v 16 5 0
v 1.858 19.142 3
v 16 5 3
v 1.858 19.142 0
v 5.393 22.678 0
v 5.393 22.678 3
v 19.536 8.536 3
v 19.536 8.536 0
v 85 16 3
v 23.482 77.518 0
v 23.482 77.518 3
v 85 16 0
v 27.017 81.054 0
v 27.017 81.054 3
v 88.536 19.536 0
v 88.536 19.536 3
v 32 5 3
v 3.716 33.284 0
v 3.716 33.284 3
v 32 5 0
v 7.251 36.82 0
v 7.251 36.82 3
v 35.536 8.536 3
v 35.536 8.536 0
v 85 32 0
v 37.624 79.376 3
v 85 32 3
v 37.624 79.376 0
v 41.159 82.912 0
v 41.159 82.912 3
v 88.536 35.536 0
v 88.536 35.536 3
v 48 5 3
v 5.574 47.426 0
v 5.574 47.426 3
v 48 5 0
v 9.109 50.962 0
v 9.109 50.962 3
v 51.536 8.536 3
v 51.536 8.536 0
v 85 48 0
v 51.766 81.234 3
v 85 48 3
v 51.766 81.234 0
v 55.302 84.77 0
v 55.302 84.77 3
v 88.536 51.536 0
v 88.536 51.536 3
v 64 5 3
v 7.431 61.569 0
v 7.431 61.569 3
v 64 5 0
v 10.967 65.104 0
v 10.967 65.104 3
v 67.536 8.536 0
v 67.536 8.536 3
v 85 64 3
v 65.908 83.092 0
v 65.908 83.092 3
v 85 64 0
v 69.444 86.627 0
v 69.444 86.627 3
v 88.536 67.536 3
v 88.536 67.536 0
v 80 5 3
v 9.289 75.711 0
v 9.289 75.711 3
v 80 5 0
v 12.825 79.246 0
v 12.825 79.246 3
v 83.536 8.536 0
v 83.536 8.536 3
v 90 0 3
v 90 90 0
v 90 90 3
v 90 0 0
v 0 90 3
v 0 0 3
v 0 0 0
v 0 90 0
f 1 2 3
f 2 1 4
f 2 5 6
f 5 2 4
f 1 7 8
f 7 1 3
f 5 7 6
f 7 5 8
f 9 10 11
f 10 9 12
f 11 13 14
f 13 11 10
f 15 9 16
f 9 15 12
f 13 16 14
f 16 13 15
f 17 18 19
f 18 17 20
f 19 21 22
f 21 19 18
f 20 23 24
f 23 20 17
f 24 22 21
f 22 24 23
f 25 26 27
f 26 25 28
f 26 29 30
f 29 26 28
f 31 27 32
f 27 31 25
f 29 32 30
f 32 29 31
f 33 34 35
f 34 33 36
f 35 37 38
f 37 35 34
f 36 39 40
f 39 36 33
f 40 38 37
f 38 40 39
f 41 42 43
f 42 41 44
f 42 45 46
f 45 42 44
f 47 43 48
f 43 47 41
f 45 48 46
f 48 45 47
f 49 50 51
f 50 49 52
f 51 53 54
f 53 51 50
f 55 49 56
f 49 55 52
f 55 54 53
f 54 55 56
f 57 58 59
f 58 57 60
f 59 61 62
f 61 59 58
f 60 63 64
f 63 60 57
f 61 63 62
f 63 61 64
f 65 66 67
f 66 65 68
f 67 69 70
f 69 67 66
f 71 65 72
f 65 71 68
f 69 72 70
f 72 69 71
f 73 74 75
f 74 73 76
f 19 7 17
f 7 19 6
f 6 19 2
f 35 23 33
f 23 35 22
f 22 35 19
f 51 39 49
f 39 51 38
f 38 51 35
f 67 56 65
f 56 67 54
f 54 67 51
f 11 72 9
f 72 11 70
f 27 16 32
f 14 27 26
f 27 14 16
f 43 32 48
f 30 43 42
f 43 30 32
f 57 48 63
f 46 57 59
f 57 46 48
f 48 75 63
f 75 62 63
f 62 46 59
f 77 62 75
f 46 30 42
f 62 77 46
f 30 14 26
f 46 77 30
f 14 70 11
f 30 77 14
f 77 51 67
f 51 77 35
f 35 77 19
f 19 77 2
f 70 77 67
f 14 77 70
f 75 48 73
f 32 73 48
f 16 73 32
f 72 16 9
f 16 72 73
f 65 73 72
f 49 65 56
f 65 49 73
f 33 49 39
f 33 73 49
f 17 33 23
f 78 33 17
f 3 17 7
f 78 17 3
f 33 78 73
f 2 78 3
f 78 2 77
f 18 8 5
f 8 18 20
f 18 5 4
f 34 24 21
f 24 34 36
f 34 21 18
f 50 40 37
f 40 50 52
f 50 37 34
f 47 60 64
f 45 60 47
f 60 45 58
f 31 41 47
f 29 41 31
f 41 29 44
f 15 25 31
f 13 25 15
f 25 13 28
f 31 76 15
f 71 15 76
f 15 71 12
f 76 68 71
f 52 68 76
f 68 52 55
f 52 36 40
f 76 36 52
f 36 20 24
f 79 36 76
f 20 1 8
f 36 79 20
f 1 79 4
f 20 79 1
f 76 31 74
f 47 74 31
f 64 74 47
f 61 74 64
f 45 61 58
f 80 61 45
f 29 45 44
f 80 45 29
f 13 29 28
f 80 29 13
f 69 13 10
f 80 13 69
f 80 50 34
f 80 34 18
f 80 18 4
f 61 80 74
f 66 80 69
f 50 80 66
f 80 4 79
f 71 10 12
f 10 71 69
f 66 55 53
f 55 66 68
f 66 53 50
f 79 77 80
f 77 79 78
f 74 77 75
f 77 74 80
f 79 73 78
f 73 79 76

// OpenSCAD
w = 90;
h = 90;
d = 3;

// holes:
hw = 5;
hw_gap = 5;
count = w / (hw + hw_gap);

difference(){
    cube([w,h,d]);
    
    for(i = [1 : count]){
        if(i < count / 2 + 0.5){
             color("red")
             cubes(i);
            }
        if (i==count/2 + 0.5) {
             color("green")
             cubes(i);
            }
        else {
             color("green")
             otherCube(i);
            }
    }
}

module cubes(var) {
     translate([var*(hw+hw_gap)+var*6, hw_gap, -1])
     rotate([0,0,45])
     cube([hw, (hw_gap*2)*(var*2), d + 2]);
    }
    
module otherCube(var) {
    translate([w-hw_gap, (var)*(hw+hw_gap)+(var)*6, -1])
    rotate([0,0,45])
    cube([hw, hw_gap*4*(count-var-3.65), d+2]);
    
    }  
